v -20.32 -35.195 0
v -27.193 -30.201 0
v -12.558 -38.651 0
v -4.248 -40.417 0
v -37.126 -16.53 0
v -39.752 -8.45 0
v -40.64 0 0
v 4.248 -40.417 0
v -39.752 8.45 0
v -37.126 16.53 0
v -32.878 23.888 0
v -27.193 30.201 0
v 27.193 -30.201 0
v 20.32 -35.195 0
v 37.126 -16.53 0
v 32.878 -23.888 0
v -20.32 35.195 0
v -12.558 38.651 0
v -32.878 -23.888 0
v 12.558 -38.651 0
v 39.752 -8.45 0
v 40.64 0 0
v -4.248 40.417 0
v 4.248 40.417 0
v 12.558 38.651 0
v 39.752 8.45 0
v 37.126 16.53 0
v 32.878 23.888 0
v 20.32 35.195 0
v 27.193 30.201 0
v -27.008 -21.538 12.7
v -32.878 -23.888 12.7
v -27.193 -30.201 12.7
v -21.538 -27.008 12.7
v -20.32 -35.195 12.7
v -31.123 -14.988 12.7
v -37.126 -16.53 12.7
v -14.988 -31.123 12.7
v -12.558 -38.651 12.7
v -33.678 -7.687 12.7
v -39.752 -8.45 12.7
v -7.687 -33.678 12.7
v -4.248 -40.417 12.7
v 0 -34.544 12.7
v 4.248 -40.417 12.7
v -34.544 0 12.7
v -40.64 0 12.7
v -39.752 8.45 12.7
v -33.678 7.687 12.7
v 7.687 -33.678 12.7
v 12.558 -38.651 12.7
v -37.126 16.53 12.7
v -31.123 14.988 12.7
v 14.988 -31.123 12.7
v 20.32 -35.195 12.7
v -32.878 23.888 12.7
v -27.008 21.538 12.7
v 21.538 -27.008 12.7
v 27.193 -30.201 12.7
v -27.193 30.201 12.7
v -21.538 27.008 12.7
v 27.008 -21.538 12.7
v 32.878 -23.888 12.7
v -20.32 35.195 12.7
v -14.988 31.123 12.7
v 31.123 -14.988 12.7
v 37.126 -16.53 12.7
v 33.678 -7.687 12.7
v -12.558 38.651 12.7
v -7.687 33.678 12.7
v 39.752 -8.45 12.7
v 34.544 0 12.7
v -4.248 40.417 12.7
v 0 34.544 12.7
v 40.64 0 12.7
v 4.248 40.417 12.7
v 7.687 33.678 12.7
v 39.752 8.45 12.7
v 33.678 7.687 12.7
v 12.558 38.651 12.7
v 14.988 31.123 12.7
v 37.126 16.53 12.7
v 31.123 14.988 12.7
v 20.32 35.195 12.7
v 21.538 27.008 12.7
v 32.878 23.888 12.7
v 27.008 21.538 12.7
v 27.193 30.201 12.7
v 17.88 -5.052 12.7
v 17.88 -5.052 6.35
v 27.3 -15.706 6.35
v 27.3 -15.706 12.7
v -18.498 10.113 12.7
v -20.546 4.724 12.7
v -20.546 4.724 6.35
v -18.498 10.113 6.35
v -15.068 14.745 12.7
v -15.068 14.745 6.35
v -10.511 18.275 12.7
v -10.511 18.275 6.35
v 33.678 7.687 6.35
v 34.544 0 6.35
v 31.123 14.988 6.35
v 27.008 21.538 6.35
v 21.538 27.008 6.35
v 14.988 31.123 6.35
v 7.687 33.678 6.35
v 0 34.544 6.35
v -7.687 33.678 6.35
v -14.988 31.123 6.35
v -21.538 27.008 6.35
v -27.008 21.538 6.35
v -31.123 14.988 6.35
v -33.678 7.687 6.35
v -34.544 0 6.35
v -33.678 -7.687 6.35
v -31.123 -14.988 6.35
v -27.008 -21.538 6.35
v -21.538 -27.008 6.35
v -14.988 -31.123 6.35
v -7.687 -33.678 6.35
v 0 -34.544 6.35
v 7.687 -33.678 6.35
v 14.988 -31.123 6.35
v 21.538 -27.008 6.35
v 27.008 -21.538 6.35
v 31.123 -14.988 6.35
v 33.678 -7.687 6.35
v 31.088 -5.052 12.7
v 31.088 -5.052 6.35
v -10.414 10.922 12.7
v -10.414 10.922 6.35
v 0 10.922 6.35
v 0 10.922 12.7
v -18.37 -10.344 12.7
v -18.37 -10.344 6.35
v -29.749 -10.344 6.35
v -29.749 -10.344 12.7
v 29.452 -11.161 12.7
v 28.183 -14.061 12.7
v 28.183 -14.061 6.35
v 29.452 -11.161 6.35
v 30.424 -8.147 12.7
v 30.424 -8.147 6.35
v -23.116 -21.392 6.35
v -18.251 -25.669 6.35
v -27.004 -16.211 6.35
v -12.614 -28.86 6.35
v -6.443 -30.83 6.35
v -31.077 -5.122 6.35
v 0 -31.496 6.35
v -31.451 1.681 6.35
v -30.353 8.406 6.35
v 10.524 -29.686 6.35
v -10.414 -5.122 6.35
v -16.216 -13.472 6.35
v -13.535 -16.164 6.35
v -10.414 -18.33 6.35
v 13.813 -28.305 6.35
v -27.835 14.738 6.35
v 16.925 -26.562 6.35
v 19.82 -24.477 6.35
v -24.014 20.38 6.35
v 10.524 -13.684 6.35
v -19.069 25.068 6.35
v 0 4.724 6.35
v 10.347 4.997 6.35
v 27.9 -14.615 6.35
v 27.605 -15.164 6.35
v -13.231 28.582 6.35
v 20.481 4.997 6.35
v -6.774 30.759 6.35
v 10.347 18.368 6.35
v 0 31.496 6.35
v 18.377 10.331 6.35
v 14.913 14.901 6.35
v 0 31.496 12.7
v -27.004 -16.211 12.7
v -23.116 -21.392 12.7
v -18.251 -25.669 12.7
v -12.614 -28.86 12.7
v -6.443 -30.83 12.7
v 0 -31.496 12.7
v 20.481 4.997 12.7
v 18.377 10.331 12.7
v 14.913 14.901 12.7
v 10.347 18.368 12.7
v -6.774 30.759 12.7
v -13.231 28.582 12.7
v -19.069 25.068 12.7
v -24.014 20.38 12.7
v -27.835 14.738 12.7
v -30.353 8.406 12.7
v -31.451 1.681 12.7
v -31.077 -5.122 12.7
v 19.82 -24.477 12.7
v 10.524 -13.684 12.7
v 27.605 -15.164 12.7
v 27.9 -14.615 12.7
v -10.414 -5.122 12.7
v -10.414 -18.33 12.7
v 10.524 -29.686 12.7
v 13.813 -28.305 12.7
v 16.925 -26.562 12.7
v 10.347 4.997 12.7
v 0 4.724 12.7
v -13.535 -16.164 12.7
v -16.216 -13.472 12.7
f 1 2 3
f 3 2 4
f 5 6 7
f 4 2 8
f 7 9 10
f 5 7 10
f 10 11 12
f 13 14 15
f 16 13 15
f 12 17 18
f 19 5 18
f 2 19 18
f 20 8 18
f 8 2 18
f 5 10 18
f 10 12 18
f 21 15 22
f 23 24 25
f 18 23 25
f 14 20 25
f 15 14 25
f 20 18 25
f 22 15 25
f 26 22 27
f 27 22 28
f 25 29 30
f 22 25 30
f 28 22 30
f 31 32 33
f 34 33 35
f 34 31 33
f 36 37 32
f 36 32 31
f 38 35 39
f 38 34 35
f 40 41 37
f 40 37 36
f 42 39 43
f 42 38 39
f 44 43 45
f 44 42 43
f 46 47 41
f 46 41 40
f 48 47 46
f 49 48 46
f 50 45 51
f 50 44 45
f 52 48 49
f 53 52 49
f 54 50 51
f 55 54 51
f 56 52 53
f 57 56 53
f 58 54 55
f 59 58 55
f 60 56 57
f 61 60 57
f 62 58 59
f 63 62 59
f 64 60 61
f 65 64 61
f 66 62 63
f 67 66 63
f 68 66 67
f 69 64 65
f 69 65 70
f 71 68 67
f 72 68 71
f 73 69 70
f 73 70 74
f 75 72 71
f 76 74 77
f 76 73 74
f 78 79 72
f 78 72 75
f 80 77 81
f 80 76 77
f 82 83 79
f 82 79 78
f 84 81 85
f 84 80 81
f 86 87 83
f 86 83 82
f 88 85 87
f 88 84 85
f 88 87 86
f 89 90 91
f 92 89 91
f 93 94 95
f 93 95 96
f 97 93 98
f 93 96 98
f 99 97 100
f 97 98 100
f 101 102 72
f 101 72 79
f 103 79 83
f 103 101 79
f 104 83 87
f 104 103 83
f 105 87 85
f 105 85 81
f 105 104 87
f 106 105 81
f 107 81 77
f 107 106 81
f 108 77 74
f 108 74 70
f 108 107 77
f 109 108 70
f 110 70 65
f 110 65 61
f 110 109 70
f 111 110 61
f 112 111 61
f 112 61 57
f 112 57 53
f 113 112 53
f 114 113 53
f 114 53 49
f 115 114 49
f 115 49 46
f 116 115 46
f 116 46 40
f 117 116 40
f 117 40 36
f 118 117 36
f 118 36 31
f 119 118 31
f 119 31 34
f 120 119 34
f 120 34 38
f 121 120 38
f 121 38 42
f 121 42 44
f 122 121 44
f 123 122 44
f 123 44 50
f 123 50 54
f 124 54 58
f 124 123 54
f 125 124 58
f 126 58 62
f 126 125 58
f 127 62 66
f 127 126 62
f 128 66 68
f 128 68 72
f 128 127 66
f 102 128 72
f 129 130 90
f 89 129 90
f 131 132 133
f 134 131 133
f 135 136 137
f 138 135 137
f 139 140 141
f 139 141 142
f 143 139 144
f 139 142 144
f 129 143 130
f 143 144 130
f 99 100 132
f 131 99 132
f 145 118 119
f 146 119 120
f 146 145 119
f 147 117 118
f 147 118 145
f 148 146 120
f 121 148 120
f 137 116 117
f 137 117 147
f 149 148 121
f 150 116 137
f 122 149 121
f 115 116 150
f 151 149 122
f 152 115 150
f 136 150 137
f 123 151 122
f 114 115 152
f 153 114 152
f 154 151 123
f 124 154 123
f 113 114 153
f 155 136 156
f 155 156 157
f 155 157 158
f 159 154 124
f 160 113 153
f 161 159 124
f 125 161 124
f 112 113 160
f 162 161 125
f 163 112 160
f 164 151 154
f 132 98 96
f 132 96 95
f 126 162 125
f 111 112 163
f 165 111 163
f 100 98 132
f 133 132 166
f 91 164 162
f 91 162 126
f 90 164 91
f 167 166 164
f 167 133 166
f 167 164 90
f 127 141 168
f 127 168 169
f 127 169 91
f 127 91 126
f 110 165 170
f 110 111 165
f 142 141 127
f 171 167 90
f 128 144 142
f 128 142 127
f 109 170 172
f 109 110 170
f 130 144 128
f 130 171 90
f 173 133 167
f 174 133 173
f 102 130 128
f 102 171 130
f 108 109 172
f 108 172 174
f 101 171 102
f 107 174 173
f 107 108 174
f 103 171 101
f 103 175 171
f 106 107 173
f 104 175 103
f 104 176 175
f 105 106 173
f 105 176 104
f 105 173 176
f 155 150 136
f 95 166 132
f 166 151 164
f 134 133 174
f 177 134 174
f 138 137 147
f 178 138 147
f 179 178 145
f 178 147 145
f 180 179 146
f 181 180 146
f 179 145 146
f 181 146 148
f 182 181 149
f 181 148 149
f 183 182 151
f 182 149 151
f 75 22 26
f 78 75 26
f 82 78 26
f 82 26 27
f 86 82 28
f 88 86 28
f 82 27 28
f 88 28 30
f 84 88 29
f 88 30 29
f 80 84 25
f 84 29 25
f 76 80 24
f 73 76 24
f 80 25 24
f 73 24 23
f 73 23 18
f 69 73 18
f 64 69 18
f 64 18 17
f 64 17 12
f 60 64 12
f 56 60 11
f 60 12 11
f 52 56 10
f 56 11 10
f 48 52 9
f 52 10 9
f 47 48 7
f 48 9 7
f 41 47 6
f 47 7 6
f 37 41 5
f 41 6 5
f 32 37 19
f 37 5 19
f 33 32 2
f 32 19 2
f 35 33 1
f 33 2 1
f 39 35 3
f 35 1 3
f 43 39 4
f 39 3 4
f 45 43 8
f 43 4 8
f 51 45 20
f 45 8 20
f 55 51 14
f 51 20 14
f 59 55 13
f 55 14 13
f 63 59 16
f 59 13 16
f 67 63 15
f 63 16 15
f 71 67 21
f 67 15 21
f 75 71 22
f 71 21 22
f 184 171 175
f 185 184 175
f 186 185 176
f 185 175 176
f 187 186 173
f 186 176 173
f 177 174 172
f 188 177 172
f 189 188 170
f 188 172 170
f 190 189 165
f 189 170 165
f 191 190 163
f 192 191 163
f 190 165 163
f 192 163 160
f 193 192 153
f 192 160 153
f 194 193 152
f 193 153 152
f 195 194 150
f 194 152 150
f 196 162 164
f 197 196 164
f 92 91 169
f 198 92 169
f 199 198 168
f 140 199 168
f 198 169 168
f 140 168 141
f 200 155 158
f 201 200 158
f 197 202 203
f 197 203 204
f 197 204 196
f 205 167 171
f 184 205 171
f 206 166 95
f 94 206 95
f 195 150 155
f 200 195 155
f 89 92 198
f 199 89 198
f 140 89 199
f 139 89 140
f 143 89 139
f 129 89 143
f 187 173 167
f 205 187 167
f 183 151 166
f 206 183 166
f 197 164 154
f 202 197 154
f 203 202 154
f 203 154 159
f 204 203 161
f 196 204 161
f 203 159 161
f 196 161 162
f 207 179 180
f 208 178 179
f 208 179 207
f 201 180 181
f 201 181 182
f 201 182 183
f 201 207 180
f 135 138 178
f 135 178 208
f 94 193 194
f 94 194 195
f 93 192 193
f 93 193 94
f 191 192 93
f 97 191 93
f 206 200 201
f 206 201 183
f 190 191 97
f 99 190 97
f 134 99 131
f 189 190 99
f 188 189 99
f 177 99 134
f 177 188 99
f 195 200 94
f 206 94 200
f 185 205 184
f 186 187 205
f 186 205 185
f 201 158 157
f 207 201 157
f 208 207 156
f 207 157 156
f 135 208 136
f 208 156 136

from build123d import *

# Parameters (mm, degrees)
F0_R     = 34.544
F1_DEPTH = 6.35
F0_R_2   = 40.64
F2_DEPTH = 12.7


with BuildPart() as f1:
    # F0 (on Top) → F1 (new body)
    with BuildSketch(Plane.XY):
        Circle(F0_R)
        with BuildLine():
            ThreePointArc((-31.076682867, -5.1222844495), (-24.0138448298, 20.3797269974), (0, 31.496))
            Line((0, 31.496), (0, 10.922))
            Line((0, 10.922), (-10.414, 10.922))
            Line((-10.414, 10.922), (-10.5108203487, 18.2749385662))
            ThreePointArc((-10.5108203487, 18.2749385662), (-16.9420488689, 12.5466212234), (-20.5458211965, 4.7244))
            Line((-20.5458211965, 4.7244), (0, 4.7244))
            Line((0, 4.7244), (0, -31.496))
            ThreePointArc((0, -31.496), (-18.2512319231, -25.6688634203), (-29.7490715955, -10.3436335592))
            Line((-29.7490715955, -10.3436335592), (-18.3700835271, -10.3436335592))
            ThreePointArc((-18.3700835271, -10.3436335592), (-14.9357796661, -14.8786158552), (-10.414, -18.3302844495))
            Line((-10.414, -18.3302844495), (-10.414, -5.1222844495))
            Line((-10.414, -5.1222844495), (-31.076682867, -5.1222844495))
        make_face(mode=Mode.SUBTRACT)
        with BuildLine():
            ThreePointArc((19.8204750869, -24.4774750195), (15.3939322044, -27.477715831), (10.523637749, -29.6858731475))
            Line((10.523637749, -29.6858731475), (10.523637749, -13.6838731475))
            Line((10.523637749, -13.6838731475), (19.8204750869, -24.4774750195))
        make_face(mode=Mode.SUBTRACT)
        with BuildLine():
            ThreePointArc((31.0882471472, -5.0516240273), (29.9760430145, -9.6661709684), (28.1829993455, -14.0611722091))
            ThreePointArc((28.1829993455, -14.0611722091), (27.753918864, -14.8901982421), (27.3004586922, -15.7061443772))
            Line((27.3004586922, -15.7061443772), (17.8802471472, -5.0516240273))
            Line((17.8802471472, -5.0516240273), (31.0882471472, -5.0516240273))
        make_face(mode=Mode.SUBTRACT)
        with BuildLine():
            ThreePointArc((10.3465438025, 18.3684445543), (16.8012840648, 12.7345034365), (20.4811438025, 4.9973465502))
            Line((20.4811438025, 4.9973465502), (10.3465438025, 4.9973465502))
            Line((10.3465438025, 4.9973465502), (10.3465438025, 18.3684445543))
        make_face(mode=Mode.SUBTRACT)
    extrude(amount=F1_DEPTH)

    # F0 (on Top) → F2 (join)
    with BuildSketch(Plane.XY):
        Circle(F0_R_2)
        Circle(F0_R, mode=Mode.SUBTRACT)
        with BuildLine():
            Line((0, 10.922), (0, 31.496))
            ThreePointArc((0, 31.496), (-24.0138448298, 20.3797269974), (-31.076682867, -5.1222844495))
            Line((-31.076682867, -5.1222844495), (-10.414, -5.1222844495))
            Line((-10.414, -5.1222844495), (-10.414, -18.3302844495))
            ThreePointArc((-10.414, -18.3302844495), (-14.9357796661, -14.8786158552), (-18.3700835271, -10.3436335592))
            Line((-18.3700835271, -10.3436335592), (-29.7490715955, -10.3436335592))
            ThreePointArc((-29.7490715955, -10.3436335592), (-18.2512319231, -25.6688634203), (0, -31.496))
            Line((0, -31.496), (0, 4.7244))
            Line((0, 4.7244), (-20.5458211965, 4.7244))
            ThreePointArc((-20.5458211965, 4.7244), (-16.9420488689, 12.5466212234), (-10.5108203487, 18.2749385662))
            Line((-10.5108203487, 18.2749385662), (-10.414, 10.922))
            Line((-10.414, 10.922), (0, 10.922))
        make_face()
        with BuildLine():
            Line((10.3465438025, 4.9973465502), (20.4811438025, 4.9973465502))
            ThreePointArc((20.4811438025, 4.9973465502), (16.8012840648, 12.7345034365), (10.3465438025, 18.3684445543))
            Line((10.3465438025, 18.3684445543), (10.3465438025, 4.9973465502))
        make_face()
        with BuildLine():
            Line((10.523637749, -13.6838731475), (10.523637749, -29.6858731475))
            ThreePointArc((10.523637749, -29.6858731475), (15.3939322044, -27.477715831), (19.8204750869, -24.4774750195))
            Line((19.8204750869, -24.4774750195), (10.523637749, -13.6838731475))
        make_face()
        with BuildLine():
            ThreePointArc((27.3004586922, -15.7061443772), (27.753918864, -14.8901982421), (28.1829993455, -14.0611722091))
            ThreePointArc((28.1829993455, -14.0611722091), (29.9760430145, -9.6661709684), (31.0882471472, -5.0516240273))
            Line((31.0882471472, -5.0516240273), (17.8802471472, -5.0516240273))
            Line((17.8802471472, -5.0516240273), (27.3004586922, -15.7061443772))
        make_face()
    extrude(amount=F2_DEPTH)


solid = f1.part
